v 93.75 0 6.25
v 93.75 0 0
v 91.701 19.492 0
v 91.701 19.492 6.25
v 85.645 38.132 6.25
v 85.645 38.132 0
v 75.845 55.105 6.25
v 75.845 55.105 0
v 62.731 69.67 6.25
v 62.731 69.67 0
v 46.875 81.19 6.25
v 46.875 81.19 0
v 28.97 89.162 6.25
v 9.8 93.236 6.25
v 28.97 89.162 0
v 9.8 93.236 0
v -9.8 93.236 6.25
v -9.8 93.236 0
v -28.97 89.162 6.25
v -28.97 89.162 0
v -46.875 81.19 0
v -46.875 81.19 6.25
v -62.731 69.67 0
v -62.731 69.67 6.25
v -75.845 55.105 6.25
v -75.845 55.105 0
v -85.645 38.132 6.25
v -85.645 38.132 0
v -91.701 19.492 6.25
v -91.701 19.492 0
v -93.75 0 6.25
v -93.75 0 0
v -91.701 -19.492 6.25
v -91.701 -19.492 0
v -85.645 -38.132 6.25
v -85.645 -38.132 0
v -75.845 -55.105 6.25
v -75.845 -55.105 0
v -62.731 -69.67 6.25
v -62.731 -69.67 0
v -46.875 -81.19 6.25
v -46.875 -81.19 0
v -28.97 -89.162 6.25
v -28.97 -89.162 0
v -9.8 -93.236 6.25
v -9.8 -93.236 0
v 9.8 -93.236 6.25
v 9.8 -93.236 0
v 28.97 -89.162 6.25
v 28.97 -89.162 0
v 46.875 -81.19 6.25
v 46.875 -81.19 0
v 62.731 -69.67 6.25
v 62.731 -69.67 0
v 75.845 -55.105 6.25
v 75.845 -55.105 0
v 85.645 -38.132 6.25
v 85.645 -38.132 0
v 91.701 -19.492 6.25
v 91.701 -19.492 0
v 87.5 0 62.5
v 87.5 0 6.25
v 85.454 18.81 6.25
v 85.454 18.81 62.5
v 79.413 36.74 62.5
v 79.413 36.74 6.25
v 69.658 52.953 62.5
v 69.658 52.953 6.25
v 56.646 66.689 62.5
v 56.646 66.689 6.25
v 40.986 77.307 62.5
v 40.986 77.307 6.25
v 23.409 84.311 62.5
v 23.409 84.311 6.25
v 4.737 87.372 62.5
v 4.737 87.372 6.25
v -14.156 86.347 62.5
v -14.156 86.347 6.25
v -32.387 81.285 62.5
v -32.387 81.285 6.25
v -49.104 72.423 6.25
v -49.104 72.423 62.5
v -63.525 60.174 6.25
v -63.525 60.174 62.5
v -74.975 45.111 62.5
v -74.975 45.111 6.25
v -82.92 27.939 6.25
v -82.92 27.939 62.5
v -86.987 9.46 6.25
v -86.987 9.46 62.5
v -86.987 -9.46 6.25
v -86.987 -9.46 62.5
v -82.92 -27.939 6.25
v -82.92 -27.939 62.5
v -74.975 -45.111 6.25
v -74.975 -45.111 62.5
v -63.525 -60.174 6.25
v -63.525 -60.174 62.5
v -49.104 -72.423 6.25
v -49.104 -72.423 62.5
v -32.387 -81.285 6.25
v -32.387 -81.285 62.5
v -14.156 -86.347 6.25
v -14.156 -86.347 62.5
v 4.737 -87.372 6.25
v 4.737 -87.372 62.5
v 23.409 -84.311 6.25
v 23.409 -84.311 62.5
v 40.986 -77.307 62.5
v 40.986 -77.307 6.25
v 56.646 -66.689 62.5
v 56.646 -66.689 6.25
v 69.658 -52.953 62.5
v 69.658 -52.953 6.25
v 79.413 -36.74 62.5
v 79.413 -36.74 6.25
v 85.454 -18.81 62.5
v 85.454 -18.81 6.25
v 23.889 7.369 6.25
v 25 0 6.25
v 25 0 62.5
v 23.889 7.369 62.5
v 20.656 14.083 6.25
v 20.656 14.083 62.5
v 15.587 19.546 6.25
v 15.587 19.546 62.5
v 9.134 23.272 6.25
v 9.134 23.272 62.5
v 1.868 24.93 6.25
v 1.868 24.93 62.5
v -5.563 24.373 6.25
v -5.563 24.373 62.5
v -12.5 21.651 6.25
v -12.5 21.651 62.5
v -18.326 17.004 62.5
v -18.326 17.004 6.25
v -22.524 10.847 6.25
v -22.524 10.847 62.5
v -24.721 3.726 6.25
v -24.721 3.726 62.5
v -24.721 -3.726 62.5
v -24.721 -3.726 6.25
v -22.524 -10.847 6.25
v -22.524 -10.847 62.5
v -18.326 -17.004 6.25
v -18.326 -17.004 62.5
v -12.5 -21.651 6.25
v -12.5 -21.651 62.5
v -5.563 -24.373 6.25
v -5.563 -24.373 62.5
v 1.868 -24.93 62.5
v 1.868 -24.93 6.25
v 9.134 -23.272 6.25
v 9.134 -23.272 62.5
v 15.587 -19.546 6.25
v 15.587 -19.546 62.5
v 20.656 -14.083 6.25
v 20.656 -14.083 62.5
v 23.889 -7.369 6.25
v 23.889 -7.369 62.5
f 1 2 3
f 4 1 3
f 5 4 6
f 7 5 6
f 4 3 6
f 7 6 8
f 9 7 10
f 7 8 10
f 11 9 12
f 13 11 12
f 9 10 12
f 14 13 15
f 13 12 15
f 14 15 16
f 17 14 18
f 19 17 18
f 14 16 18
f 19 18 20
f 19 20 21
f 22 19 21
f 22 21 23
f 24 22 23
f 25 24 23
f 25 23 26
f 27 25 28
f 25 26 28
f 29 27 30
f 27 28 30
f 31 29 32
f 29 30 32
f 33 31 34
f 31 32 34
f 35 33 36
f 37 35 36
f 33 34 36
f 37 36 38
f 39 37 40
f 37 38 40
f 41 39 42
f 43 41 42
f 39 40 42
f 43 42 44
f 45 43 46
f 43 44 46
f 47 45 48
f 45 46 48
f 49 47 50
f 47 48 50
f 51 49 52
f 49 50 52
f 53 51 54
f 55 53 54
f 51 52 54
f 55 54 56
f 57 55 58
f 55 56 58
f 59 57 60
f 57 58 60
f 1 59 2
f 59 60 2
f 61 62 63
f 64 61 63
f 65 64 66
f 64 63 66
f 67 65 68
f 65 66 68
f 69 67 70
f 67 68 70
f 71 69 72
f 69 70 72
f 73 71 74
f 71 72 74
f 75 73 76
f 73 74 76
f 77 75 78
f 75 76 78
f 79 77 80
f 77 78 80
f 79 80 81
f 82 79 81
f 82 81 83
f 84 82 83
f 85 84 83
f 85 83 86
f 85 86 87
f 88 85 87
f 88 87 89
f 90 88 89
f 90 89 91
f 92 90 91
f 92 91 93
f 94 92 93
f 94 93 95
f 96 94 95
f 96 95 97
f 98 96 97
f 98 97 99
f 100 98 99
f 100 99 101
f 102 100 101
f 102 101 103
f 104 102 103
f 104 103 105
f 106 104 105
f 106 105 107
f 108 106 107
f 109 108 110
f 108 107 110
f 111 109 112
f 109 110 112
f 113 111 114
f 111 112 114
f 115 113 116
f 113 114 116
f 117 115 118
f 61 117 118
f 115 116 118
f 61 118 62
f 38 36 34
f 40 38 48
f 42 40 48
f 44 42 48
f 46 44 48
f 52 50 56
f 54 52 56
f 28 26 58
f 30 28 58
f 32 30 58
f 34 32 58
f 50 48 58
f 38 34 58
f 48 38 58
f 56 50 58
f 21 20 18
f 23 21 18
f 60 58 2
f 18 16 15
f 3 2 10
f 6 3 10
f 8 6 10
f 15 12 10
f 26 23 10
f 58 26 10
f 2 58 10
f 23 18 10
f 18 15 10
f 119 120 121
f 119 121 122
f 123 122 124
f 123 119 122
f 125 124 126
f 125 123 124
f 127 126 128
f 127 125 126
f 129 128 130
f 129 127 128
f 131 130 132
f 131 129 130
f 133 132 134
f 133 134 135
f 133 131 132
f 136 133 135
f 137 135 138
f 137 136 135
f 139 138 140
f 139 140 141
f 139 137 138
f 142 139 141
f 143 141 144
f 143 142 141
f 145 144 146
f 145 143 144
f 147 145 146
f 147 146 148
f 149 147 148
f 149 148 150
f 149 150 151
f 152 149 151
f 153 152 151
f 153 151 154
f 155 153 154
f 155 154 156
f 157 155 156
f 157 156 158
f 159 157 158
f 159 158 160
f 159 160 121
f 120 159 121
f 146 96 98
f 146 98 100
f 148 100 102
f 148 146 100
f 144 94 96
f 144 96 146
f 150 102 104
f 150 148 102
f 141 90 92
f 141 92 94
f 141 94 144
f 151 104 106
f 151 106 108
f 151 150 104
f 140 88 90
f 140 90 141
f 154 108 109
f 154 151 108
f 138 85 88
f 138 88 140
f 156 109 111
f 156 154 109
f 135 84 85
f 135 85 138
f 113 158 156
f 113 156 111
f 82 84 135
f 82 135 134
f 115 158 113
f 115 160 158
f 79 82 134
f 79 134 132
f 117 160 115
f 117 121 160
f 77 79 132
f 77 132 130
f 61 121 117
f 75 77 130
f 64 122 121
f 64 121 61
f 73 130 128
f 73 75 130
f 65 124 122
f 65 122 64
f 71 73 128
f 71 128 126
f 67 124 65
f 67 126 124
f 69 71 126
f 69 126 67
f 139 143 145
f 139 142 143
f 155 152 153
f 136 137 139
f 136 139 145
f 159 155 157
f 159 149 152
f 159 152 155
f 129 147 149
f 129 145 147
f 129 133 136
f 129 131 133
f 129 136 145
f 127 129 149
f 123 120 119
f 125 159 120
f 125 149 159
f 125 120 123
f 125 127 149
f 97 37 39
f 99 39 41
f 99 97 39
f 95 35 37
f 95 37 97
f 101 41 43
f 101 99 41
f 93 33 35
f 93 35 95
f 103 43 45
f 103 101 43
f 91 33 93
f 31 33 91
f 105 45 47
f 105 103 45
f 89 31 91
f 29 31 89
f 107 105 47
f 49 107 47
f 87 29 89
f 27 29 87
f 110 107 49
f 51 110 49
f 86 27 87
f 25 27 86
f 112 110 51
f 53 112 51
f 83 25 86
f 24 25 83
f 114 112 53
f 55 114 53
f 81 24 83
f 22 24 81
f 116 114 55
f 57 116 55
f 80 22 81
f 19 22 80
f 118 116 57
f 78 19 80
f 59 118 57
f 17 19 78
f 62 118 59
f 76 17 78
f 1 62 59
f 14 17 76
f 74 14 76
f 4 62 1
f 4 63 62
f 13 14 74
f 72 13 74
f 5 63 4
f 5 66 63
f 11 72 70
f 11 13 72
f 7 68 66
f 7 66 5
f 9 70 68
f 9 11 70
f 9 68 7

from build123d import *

# Parameters (mm, degrees)
SKETCH1_R           = 87.5
SKETCH1_R_2         = 25
BOSS_EXTRUDE1_DEPTH = 62.5
SKETCH2_R           = 93.75
BOSS_EXTRUDE3_DEPTH = 6.25


with BuildPart() as part:
    # Sketch1 → Boss-Extrude1 (new body)
    with BuildSketch(Plane.XY):
        Circle(SKETCH1_R)
        Circle(SKETCH1_R_2, mode=Mode.SUBTRACT)
    extrude(amount=BOSS_EXTRUDE1_DEPTH)

    # Sketch2 → Boss-Extrude3 (add)
    with BuildSketch(Plane.XY):
        Circle(SKETCH2_R)
    extrude(amount=BOSS_EXTRUDE3_DEPTH)


solid = part.part
